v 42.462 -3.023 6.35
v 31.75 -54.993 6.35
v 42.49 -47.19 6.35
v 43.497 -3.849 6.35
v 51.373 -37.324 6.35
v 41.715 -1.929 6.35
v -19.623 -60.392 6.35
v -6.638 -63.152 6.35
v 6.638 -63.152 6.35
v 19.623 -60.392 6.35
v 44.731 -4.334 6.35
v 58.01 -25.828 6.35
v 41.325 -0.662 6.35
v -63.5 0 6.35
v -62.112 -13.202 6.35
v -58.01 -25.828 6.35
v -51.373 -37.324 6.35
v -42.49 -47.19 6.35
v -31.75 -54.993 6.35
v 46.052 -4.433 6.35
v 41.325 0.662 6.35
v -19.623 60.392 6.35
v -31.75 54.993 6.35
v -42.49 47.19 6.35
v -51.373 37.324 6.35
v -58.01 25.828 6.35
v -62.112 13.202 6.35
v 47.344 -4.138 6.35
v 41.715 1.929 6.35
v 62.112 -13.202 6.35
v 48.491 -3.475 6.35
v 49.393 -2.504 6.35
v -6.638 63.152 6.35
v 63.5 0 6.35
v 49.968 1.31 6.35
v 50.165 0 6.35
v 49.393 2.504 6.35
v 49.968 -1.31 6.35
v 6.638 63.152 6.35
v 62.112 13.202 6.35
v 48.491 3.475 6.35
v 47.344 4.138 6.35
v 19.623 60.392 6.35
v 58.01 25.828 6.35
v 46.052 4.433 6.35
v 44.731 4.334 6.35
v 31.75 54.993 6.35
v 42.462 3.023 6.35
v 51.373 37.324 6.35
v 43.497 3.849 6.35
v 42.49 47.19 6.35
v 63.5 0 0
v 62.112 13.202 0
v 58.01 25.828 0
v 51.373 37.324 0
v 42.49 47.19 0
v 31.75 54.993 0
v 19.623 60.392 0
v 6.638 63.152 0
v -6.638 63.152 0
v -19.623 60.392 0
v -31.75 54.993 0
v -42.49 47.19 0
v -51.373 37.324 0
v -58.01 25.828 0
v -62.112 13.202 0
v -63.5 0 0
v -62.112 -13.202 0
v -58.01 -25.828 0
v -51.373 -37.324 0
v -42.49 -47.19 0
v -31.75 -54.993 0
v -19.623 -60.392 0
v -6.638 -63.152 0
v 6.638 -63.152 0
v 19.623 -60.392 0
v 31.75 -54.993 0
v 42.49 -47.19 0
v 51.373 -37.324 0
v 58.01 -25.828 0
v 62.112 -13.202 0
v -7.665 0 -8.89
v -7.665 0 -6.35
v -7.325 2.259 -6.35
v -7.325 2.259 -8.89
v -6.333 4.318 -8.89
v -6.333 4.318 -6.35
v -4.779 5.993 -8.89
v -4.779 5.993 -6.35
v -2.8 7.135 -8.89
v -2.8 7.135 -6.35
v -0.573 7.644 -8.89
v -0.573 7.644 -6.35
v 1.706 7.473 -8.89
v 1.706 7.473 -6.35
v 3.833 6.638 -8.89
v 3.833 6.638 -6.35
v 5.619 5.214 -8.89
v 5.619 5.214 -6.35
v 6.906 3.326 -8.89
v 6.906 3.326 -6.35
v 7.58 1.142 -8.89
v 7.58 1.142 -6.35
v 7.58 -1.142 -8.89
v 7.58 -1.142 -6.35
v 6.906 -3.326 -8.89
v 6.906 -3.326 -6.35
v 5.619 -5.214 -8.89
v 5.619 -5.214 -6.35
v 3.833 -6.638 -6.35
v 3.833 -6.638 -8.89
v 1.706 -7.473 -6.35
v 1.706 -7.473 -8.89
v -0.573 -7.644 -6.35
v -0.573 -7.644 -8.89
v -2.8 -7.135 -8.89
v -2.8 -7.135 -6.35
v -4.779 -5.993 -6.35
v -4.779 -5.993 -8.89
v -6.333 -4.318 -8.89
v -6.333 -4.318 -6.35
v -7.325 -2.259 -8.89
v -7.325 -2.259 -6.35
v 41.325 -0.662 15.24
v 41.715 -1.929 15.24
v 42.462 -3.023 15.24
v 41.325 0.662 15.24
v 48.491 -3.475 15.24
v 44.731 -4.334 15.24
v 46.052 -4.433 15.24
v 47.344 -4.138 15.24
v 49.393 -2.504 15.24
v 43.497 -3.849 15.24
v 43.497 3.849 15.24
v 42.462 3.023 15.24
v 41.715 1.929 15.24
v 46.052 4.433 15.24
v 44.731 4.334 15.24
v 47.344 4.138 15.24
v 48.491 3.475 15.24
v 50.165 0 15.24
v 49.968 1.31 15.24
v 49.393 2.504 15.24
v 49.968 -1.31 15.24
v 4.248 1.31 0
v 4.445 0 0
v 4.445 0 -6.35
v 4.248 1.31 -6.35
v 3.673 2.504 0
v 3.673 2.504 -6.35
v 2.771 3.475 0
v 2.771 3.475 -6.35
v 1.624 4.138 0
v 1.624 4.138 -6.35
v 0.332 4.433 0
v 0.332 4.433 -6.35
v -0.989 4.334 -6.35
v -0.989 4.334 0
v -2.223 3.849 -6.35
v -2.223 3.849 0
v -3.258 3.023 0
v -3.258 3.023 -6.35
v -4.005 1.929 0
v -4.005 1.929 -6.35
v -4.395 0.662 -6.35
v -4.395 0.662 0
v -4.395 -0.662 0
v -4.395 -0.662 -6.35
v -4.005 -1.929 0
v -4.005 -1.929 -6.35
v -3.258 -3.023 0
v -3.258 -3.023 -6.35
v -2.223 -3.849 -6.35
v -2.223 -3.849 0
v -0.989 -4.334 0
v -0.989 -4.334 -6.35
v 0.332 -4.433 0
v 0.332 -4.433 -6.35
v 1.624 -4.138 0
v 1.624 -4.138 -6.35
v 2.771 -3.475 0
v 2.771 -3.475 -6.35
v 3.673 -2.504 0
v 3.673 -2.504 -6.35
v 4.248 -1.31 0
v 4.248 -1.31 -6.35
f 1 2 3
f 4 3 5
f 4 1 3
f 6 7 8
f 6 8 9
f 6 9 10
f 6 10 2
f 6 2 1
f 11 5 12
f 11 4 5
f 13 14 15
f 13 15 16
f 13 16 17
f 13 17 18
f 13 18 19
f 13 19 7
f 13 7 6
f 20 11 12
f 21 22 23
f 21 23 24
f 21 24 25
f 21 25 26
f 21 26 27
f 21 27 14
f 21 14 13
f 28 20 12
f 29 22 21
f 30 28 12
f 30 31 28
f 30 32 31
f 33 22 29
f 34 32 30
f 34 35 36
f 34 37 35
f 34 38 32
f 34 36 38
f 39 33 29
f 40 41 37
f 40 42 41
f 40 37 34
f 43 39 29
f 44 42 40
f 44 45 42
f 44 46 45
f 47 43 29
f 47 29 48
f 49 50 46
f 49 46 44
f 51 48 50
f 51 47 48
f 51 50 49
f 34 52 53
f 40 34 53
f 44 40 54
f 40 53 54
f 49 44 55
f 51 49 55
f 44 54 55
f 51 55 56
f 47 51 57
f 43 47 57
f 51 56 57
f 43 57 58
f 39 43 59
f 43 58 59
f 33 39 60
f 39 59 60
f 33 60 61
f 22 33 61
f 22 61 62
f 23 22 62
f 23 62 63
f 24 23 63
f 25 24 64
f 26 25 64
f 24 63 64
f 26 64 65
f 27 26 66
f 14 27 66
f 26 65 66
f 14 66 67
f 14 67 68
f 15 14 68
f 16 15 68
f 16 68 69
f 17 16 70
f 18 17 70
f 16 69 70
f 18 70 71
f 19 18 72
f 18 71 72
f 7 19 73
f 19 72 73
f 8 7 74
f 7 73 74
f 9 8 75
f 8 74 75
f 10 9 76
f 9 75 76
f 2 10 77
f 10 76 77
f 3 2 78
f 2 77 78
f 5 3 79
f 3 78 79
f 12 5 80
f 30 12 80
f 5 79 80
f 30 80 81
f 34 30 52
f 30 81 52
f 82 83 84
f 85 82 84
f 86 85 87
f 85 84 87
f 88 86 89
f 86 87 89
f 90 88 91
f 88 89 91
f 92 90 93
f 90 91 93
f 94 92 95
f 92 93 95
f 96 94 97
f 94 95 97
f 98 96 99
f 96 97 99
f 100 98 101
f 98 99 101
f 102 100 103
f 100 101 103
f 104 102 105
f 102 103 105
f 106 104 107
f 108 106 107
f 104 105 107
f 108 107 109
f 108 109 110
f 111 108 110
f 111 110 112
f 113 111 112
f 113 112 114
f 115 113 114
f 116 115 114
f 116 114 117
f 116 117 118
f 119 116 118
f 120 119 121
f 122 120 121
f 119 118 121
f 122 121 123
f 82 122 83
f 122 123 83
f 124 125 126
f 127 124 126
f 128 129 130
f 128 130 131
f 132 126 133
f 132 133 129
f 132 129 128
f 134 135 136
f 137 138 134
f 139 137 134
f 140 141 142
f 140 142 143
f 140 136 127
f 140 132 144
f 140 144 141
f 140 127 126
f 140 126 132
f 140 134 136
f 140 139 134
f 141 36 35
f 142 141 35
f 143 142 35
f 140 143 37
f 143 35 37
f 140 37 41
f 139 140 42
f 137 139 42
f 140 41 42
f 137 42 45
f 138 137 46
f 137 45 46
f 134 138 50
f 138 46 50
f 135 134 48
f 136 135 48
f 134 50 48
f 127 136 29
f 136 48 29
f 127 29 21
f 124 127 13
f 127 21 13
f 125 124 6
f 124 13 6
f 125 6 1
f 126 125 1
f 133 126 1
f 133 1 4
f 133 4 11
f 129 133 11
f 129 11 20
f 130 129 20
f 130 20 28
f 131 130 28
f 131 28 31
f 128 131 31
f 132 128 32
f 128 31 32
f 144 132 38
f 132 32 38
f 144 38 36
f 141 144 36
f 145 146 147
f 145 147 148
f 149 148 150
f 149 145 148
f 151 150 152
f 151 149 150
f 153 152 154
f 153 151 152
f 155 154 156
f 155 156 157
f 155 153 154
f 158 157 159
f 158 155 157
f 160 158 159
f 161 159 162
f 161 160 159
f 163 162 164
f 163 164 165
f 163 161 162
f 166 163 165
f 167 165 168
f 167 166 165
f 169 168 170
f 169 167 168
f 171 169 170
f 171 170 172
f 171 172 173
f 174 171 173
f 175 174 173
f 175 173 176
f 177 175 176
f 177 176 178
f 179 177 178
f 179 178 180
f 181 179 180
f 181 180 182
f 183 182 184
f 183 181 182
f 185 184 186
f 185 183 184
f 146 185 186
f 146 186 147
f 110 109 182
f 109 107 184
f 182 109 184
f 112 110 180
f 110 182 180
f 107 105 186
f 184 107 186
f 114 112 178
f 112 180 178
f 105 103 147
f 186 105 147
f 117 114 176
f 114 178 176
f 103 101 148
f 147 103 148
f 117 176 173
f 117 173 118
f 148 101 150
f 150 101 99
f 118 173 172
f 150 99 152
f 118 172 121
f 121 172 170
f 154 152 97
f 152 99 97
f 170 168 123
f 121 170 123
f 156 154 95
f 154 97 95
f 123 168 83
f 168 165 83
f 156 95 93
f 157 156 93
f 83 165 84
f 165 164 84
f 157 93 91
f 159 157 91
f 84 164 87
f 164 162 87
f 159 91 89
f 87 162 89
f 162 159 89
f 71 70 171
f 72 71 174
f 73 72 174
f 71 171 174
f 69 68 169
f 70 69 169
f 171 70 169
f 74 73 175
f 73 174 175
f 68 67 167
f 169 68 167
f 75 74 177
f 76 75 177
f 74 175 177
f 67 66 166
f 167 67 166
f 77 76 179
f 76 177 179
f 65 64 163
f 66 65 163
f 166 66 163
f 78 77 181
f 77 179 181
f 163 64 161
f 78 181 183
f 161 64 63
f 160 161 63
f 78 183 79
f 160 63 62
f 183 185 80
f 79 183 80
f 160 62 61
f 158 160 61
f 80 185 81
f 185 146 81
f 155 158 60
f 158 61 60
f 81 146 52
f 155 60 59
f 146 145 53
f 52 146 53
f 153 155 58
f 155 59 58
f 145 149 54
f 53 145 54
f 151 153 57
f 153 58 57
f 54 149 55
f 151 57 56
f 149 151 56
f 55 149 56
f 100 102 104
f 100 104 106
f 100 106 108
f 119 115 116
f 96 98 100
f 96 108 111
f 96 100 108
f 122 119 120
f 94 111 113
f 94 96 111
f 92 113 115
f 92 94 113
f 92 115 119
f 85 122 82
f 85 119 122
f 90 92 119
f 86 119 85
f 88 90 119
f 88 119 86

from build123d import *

# Parameters (mm, degrees)
SKETCH1_R           = 63.5
BOSS_EXTRUDE1_DEPTH = 6.35
SKETCH2_R           = 4.445
BOSS_EXTRUDE2_DEPTH = 8.89
SKETCH1_3_R         = 4.445
BOSS_EXTRUDE3_DEPTH = 6.35
SKETCH3_R           = 7.665246074
BOSS_EXTRUDE4_DEPTH = 2.54


with BuildPart() as part:
    # Sketch1 → Boss-Extrude1 (new body)
    with BuildSketch(Plane.XY):
        Circle(SKETCH1_R)
    extrude(amount=BOSS_EXTRUDE1_DEPTH)

    # Sketch2 → Boss-Extrude2 (add)
    with BuildSketch(Plane.XY.offset(6.35)):
        with Locations((45.72, 0)):
            Circle(SKETCH2_R)
    extrude(amount=BOSS_EXTRUDE2_DEPTH)

    # Sketch1<3> → Boss-Extrude3 (add)
    with BuildSketch(Plane.XY):
        Circle(SKETCH1_3_R)
    extrude(amount=-BOSS_EXTRUDE3_DEPTH)

    # Sketch3 → Boss-Extrude4 (add)
    with BuildSketch(Plane(origin=(0, 0, -6.35), x_dir=(-1, 0, 0), z_dir=(0, 0, -1))):
        Circle(SKETCH3_R)
    extrude(amount=BOSS_EXTRUDE4_DEPTH)


solid = part.part
